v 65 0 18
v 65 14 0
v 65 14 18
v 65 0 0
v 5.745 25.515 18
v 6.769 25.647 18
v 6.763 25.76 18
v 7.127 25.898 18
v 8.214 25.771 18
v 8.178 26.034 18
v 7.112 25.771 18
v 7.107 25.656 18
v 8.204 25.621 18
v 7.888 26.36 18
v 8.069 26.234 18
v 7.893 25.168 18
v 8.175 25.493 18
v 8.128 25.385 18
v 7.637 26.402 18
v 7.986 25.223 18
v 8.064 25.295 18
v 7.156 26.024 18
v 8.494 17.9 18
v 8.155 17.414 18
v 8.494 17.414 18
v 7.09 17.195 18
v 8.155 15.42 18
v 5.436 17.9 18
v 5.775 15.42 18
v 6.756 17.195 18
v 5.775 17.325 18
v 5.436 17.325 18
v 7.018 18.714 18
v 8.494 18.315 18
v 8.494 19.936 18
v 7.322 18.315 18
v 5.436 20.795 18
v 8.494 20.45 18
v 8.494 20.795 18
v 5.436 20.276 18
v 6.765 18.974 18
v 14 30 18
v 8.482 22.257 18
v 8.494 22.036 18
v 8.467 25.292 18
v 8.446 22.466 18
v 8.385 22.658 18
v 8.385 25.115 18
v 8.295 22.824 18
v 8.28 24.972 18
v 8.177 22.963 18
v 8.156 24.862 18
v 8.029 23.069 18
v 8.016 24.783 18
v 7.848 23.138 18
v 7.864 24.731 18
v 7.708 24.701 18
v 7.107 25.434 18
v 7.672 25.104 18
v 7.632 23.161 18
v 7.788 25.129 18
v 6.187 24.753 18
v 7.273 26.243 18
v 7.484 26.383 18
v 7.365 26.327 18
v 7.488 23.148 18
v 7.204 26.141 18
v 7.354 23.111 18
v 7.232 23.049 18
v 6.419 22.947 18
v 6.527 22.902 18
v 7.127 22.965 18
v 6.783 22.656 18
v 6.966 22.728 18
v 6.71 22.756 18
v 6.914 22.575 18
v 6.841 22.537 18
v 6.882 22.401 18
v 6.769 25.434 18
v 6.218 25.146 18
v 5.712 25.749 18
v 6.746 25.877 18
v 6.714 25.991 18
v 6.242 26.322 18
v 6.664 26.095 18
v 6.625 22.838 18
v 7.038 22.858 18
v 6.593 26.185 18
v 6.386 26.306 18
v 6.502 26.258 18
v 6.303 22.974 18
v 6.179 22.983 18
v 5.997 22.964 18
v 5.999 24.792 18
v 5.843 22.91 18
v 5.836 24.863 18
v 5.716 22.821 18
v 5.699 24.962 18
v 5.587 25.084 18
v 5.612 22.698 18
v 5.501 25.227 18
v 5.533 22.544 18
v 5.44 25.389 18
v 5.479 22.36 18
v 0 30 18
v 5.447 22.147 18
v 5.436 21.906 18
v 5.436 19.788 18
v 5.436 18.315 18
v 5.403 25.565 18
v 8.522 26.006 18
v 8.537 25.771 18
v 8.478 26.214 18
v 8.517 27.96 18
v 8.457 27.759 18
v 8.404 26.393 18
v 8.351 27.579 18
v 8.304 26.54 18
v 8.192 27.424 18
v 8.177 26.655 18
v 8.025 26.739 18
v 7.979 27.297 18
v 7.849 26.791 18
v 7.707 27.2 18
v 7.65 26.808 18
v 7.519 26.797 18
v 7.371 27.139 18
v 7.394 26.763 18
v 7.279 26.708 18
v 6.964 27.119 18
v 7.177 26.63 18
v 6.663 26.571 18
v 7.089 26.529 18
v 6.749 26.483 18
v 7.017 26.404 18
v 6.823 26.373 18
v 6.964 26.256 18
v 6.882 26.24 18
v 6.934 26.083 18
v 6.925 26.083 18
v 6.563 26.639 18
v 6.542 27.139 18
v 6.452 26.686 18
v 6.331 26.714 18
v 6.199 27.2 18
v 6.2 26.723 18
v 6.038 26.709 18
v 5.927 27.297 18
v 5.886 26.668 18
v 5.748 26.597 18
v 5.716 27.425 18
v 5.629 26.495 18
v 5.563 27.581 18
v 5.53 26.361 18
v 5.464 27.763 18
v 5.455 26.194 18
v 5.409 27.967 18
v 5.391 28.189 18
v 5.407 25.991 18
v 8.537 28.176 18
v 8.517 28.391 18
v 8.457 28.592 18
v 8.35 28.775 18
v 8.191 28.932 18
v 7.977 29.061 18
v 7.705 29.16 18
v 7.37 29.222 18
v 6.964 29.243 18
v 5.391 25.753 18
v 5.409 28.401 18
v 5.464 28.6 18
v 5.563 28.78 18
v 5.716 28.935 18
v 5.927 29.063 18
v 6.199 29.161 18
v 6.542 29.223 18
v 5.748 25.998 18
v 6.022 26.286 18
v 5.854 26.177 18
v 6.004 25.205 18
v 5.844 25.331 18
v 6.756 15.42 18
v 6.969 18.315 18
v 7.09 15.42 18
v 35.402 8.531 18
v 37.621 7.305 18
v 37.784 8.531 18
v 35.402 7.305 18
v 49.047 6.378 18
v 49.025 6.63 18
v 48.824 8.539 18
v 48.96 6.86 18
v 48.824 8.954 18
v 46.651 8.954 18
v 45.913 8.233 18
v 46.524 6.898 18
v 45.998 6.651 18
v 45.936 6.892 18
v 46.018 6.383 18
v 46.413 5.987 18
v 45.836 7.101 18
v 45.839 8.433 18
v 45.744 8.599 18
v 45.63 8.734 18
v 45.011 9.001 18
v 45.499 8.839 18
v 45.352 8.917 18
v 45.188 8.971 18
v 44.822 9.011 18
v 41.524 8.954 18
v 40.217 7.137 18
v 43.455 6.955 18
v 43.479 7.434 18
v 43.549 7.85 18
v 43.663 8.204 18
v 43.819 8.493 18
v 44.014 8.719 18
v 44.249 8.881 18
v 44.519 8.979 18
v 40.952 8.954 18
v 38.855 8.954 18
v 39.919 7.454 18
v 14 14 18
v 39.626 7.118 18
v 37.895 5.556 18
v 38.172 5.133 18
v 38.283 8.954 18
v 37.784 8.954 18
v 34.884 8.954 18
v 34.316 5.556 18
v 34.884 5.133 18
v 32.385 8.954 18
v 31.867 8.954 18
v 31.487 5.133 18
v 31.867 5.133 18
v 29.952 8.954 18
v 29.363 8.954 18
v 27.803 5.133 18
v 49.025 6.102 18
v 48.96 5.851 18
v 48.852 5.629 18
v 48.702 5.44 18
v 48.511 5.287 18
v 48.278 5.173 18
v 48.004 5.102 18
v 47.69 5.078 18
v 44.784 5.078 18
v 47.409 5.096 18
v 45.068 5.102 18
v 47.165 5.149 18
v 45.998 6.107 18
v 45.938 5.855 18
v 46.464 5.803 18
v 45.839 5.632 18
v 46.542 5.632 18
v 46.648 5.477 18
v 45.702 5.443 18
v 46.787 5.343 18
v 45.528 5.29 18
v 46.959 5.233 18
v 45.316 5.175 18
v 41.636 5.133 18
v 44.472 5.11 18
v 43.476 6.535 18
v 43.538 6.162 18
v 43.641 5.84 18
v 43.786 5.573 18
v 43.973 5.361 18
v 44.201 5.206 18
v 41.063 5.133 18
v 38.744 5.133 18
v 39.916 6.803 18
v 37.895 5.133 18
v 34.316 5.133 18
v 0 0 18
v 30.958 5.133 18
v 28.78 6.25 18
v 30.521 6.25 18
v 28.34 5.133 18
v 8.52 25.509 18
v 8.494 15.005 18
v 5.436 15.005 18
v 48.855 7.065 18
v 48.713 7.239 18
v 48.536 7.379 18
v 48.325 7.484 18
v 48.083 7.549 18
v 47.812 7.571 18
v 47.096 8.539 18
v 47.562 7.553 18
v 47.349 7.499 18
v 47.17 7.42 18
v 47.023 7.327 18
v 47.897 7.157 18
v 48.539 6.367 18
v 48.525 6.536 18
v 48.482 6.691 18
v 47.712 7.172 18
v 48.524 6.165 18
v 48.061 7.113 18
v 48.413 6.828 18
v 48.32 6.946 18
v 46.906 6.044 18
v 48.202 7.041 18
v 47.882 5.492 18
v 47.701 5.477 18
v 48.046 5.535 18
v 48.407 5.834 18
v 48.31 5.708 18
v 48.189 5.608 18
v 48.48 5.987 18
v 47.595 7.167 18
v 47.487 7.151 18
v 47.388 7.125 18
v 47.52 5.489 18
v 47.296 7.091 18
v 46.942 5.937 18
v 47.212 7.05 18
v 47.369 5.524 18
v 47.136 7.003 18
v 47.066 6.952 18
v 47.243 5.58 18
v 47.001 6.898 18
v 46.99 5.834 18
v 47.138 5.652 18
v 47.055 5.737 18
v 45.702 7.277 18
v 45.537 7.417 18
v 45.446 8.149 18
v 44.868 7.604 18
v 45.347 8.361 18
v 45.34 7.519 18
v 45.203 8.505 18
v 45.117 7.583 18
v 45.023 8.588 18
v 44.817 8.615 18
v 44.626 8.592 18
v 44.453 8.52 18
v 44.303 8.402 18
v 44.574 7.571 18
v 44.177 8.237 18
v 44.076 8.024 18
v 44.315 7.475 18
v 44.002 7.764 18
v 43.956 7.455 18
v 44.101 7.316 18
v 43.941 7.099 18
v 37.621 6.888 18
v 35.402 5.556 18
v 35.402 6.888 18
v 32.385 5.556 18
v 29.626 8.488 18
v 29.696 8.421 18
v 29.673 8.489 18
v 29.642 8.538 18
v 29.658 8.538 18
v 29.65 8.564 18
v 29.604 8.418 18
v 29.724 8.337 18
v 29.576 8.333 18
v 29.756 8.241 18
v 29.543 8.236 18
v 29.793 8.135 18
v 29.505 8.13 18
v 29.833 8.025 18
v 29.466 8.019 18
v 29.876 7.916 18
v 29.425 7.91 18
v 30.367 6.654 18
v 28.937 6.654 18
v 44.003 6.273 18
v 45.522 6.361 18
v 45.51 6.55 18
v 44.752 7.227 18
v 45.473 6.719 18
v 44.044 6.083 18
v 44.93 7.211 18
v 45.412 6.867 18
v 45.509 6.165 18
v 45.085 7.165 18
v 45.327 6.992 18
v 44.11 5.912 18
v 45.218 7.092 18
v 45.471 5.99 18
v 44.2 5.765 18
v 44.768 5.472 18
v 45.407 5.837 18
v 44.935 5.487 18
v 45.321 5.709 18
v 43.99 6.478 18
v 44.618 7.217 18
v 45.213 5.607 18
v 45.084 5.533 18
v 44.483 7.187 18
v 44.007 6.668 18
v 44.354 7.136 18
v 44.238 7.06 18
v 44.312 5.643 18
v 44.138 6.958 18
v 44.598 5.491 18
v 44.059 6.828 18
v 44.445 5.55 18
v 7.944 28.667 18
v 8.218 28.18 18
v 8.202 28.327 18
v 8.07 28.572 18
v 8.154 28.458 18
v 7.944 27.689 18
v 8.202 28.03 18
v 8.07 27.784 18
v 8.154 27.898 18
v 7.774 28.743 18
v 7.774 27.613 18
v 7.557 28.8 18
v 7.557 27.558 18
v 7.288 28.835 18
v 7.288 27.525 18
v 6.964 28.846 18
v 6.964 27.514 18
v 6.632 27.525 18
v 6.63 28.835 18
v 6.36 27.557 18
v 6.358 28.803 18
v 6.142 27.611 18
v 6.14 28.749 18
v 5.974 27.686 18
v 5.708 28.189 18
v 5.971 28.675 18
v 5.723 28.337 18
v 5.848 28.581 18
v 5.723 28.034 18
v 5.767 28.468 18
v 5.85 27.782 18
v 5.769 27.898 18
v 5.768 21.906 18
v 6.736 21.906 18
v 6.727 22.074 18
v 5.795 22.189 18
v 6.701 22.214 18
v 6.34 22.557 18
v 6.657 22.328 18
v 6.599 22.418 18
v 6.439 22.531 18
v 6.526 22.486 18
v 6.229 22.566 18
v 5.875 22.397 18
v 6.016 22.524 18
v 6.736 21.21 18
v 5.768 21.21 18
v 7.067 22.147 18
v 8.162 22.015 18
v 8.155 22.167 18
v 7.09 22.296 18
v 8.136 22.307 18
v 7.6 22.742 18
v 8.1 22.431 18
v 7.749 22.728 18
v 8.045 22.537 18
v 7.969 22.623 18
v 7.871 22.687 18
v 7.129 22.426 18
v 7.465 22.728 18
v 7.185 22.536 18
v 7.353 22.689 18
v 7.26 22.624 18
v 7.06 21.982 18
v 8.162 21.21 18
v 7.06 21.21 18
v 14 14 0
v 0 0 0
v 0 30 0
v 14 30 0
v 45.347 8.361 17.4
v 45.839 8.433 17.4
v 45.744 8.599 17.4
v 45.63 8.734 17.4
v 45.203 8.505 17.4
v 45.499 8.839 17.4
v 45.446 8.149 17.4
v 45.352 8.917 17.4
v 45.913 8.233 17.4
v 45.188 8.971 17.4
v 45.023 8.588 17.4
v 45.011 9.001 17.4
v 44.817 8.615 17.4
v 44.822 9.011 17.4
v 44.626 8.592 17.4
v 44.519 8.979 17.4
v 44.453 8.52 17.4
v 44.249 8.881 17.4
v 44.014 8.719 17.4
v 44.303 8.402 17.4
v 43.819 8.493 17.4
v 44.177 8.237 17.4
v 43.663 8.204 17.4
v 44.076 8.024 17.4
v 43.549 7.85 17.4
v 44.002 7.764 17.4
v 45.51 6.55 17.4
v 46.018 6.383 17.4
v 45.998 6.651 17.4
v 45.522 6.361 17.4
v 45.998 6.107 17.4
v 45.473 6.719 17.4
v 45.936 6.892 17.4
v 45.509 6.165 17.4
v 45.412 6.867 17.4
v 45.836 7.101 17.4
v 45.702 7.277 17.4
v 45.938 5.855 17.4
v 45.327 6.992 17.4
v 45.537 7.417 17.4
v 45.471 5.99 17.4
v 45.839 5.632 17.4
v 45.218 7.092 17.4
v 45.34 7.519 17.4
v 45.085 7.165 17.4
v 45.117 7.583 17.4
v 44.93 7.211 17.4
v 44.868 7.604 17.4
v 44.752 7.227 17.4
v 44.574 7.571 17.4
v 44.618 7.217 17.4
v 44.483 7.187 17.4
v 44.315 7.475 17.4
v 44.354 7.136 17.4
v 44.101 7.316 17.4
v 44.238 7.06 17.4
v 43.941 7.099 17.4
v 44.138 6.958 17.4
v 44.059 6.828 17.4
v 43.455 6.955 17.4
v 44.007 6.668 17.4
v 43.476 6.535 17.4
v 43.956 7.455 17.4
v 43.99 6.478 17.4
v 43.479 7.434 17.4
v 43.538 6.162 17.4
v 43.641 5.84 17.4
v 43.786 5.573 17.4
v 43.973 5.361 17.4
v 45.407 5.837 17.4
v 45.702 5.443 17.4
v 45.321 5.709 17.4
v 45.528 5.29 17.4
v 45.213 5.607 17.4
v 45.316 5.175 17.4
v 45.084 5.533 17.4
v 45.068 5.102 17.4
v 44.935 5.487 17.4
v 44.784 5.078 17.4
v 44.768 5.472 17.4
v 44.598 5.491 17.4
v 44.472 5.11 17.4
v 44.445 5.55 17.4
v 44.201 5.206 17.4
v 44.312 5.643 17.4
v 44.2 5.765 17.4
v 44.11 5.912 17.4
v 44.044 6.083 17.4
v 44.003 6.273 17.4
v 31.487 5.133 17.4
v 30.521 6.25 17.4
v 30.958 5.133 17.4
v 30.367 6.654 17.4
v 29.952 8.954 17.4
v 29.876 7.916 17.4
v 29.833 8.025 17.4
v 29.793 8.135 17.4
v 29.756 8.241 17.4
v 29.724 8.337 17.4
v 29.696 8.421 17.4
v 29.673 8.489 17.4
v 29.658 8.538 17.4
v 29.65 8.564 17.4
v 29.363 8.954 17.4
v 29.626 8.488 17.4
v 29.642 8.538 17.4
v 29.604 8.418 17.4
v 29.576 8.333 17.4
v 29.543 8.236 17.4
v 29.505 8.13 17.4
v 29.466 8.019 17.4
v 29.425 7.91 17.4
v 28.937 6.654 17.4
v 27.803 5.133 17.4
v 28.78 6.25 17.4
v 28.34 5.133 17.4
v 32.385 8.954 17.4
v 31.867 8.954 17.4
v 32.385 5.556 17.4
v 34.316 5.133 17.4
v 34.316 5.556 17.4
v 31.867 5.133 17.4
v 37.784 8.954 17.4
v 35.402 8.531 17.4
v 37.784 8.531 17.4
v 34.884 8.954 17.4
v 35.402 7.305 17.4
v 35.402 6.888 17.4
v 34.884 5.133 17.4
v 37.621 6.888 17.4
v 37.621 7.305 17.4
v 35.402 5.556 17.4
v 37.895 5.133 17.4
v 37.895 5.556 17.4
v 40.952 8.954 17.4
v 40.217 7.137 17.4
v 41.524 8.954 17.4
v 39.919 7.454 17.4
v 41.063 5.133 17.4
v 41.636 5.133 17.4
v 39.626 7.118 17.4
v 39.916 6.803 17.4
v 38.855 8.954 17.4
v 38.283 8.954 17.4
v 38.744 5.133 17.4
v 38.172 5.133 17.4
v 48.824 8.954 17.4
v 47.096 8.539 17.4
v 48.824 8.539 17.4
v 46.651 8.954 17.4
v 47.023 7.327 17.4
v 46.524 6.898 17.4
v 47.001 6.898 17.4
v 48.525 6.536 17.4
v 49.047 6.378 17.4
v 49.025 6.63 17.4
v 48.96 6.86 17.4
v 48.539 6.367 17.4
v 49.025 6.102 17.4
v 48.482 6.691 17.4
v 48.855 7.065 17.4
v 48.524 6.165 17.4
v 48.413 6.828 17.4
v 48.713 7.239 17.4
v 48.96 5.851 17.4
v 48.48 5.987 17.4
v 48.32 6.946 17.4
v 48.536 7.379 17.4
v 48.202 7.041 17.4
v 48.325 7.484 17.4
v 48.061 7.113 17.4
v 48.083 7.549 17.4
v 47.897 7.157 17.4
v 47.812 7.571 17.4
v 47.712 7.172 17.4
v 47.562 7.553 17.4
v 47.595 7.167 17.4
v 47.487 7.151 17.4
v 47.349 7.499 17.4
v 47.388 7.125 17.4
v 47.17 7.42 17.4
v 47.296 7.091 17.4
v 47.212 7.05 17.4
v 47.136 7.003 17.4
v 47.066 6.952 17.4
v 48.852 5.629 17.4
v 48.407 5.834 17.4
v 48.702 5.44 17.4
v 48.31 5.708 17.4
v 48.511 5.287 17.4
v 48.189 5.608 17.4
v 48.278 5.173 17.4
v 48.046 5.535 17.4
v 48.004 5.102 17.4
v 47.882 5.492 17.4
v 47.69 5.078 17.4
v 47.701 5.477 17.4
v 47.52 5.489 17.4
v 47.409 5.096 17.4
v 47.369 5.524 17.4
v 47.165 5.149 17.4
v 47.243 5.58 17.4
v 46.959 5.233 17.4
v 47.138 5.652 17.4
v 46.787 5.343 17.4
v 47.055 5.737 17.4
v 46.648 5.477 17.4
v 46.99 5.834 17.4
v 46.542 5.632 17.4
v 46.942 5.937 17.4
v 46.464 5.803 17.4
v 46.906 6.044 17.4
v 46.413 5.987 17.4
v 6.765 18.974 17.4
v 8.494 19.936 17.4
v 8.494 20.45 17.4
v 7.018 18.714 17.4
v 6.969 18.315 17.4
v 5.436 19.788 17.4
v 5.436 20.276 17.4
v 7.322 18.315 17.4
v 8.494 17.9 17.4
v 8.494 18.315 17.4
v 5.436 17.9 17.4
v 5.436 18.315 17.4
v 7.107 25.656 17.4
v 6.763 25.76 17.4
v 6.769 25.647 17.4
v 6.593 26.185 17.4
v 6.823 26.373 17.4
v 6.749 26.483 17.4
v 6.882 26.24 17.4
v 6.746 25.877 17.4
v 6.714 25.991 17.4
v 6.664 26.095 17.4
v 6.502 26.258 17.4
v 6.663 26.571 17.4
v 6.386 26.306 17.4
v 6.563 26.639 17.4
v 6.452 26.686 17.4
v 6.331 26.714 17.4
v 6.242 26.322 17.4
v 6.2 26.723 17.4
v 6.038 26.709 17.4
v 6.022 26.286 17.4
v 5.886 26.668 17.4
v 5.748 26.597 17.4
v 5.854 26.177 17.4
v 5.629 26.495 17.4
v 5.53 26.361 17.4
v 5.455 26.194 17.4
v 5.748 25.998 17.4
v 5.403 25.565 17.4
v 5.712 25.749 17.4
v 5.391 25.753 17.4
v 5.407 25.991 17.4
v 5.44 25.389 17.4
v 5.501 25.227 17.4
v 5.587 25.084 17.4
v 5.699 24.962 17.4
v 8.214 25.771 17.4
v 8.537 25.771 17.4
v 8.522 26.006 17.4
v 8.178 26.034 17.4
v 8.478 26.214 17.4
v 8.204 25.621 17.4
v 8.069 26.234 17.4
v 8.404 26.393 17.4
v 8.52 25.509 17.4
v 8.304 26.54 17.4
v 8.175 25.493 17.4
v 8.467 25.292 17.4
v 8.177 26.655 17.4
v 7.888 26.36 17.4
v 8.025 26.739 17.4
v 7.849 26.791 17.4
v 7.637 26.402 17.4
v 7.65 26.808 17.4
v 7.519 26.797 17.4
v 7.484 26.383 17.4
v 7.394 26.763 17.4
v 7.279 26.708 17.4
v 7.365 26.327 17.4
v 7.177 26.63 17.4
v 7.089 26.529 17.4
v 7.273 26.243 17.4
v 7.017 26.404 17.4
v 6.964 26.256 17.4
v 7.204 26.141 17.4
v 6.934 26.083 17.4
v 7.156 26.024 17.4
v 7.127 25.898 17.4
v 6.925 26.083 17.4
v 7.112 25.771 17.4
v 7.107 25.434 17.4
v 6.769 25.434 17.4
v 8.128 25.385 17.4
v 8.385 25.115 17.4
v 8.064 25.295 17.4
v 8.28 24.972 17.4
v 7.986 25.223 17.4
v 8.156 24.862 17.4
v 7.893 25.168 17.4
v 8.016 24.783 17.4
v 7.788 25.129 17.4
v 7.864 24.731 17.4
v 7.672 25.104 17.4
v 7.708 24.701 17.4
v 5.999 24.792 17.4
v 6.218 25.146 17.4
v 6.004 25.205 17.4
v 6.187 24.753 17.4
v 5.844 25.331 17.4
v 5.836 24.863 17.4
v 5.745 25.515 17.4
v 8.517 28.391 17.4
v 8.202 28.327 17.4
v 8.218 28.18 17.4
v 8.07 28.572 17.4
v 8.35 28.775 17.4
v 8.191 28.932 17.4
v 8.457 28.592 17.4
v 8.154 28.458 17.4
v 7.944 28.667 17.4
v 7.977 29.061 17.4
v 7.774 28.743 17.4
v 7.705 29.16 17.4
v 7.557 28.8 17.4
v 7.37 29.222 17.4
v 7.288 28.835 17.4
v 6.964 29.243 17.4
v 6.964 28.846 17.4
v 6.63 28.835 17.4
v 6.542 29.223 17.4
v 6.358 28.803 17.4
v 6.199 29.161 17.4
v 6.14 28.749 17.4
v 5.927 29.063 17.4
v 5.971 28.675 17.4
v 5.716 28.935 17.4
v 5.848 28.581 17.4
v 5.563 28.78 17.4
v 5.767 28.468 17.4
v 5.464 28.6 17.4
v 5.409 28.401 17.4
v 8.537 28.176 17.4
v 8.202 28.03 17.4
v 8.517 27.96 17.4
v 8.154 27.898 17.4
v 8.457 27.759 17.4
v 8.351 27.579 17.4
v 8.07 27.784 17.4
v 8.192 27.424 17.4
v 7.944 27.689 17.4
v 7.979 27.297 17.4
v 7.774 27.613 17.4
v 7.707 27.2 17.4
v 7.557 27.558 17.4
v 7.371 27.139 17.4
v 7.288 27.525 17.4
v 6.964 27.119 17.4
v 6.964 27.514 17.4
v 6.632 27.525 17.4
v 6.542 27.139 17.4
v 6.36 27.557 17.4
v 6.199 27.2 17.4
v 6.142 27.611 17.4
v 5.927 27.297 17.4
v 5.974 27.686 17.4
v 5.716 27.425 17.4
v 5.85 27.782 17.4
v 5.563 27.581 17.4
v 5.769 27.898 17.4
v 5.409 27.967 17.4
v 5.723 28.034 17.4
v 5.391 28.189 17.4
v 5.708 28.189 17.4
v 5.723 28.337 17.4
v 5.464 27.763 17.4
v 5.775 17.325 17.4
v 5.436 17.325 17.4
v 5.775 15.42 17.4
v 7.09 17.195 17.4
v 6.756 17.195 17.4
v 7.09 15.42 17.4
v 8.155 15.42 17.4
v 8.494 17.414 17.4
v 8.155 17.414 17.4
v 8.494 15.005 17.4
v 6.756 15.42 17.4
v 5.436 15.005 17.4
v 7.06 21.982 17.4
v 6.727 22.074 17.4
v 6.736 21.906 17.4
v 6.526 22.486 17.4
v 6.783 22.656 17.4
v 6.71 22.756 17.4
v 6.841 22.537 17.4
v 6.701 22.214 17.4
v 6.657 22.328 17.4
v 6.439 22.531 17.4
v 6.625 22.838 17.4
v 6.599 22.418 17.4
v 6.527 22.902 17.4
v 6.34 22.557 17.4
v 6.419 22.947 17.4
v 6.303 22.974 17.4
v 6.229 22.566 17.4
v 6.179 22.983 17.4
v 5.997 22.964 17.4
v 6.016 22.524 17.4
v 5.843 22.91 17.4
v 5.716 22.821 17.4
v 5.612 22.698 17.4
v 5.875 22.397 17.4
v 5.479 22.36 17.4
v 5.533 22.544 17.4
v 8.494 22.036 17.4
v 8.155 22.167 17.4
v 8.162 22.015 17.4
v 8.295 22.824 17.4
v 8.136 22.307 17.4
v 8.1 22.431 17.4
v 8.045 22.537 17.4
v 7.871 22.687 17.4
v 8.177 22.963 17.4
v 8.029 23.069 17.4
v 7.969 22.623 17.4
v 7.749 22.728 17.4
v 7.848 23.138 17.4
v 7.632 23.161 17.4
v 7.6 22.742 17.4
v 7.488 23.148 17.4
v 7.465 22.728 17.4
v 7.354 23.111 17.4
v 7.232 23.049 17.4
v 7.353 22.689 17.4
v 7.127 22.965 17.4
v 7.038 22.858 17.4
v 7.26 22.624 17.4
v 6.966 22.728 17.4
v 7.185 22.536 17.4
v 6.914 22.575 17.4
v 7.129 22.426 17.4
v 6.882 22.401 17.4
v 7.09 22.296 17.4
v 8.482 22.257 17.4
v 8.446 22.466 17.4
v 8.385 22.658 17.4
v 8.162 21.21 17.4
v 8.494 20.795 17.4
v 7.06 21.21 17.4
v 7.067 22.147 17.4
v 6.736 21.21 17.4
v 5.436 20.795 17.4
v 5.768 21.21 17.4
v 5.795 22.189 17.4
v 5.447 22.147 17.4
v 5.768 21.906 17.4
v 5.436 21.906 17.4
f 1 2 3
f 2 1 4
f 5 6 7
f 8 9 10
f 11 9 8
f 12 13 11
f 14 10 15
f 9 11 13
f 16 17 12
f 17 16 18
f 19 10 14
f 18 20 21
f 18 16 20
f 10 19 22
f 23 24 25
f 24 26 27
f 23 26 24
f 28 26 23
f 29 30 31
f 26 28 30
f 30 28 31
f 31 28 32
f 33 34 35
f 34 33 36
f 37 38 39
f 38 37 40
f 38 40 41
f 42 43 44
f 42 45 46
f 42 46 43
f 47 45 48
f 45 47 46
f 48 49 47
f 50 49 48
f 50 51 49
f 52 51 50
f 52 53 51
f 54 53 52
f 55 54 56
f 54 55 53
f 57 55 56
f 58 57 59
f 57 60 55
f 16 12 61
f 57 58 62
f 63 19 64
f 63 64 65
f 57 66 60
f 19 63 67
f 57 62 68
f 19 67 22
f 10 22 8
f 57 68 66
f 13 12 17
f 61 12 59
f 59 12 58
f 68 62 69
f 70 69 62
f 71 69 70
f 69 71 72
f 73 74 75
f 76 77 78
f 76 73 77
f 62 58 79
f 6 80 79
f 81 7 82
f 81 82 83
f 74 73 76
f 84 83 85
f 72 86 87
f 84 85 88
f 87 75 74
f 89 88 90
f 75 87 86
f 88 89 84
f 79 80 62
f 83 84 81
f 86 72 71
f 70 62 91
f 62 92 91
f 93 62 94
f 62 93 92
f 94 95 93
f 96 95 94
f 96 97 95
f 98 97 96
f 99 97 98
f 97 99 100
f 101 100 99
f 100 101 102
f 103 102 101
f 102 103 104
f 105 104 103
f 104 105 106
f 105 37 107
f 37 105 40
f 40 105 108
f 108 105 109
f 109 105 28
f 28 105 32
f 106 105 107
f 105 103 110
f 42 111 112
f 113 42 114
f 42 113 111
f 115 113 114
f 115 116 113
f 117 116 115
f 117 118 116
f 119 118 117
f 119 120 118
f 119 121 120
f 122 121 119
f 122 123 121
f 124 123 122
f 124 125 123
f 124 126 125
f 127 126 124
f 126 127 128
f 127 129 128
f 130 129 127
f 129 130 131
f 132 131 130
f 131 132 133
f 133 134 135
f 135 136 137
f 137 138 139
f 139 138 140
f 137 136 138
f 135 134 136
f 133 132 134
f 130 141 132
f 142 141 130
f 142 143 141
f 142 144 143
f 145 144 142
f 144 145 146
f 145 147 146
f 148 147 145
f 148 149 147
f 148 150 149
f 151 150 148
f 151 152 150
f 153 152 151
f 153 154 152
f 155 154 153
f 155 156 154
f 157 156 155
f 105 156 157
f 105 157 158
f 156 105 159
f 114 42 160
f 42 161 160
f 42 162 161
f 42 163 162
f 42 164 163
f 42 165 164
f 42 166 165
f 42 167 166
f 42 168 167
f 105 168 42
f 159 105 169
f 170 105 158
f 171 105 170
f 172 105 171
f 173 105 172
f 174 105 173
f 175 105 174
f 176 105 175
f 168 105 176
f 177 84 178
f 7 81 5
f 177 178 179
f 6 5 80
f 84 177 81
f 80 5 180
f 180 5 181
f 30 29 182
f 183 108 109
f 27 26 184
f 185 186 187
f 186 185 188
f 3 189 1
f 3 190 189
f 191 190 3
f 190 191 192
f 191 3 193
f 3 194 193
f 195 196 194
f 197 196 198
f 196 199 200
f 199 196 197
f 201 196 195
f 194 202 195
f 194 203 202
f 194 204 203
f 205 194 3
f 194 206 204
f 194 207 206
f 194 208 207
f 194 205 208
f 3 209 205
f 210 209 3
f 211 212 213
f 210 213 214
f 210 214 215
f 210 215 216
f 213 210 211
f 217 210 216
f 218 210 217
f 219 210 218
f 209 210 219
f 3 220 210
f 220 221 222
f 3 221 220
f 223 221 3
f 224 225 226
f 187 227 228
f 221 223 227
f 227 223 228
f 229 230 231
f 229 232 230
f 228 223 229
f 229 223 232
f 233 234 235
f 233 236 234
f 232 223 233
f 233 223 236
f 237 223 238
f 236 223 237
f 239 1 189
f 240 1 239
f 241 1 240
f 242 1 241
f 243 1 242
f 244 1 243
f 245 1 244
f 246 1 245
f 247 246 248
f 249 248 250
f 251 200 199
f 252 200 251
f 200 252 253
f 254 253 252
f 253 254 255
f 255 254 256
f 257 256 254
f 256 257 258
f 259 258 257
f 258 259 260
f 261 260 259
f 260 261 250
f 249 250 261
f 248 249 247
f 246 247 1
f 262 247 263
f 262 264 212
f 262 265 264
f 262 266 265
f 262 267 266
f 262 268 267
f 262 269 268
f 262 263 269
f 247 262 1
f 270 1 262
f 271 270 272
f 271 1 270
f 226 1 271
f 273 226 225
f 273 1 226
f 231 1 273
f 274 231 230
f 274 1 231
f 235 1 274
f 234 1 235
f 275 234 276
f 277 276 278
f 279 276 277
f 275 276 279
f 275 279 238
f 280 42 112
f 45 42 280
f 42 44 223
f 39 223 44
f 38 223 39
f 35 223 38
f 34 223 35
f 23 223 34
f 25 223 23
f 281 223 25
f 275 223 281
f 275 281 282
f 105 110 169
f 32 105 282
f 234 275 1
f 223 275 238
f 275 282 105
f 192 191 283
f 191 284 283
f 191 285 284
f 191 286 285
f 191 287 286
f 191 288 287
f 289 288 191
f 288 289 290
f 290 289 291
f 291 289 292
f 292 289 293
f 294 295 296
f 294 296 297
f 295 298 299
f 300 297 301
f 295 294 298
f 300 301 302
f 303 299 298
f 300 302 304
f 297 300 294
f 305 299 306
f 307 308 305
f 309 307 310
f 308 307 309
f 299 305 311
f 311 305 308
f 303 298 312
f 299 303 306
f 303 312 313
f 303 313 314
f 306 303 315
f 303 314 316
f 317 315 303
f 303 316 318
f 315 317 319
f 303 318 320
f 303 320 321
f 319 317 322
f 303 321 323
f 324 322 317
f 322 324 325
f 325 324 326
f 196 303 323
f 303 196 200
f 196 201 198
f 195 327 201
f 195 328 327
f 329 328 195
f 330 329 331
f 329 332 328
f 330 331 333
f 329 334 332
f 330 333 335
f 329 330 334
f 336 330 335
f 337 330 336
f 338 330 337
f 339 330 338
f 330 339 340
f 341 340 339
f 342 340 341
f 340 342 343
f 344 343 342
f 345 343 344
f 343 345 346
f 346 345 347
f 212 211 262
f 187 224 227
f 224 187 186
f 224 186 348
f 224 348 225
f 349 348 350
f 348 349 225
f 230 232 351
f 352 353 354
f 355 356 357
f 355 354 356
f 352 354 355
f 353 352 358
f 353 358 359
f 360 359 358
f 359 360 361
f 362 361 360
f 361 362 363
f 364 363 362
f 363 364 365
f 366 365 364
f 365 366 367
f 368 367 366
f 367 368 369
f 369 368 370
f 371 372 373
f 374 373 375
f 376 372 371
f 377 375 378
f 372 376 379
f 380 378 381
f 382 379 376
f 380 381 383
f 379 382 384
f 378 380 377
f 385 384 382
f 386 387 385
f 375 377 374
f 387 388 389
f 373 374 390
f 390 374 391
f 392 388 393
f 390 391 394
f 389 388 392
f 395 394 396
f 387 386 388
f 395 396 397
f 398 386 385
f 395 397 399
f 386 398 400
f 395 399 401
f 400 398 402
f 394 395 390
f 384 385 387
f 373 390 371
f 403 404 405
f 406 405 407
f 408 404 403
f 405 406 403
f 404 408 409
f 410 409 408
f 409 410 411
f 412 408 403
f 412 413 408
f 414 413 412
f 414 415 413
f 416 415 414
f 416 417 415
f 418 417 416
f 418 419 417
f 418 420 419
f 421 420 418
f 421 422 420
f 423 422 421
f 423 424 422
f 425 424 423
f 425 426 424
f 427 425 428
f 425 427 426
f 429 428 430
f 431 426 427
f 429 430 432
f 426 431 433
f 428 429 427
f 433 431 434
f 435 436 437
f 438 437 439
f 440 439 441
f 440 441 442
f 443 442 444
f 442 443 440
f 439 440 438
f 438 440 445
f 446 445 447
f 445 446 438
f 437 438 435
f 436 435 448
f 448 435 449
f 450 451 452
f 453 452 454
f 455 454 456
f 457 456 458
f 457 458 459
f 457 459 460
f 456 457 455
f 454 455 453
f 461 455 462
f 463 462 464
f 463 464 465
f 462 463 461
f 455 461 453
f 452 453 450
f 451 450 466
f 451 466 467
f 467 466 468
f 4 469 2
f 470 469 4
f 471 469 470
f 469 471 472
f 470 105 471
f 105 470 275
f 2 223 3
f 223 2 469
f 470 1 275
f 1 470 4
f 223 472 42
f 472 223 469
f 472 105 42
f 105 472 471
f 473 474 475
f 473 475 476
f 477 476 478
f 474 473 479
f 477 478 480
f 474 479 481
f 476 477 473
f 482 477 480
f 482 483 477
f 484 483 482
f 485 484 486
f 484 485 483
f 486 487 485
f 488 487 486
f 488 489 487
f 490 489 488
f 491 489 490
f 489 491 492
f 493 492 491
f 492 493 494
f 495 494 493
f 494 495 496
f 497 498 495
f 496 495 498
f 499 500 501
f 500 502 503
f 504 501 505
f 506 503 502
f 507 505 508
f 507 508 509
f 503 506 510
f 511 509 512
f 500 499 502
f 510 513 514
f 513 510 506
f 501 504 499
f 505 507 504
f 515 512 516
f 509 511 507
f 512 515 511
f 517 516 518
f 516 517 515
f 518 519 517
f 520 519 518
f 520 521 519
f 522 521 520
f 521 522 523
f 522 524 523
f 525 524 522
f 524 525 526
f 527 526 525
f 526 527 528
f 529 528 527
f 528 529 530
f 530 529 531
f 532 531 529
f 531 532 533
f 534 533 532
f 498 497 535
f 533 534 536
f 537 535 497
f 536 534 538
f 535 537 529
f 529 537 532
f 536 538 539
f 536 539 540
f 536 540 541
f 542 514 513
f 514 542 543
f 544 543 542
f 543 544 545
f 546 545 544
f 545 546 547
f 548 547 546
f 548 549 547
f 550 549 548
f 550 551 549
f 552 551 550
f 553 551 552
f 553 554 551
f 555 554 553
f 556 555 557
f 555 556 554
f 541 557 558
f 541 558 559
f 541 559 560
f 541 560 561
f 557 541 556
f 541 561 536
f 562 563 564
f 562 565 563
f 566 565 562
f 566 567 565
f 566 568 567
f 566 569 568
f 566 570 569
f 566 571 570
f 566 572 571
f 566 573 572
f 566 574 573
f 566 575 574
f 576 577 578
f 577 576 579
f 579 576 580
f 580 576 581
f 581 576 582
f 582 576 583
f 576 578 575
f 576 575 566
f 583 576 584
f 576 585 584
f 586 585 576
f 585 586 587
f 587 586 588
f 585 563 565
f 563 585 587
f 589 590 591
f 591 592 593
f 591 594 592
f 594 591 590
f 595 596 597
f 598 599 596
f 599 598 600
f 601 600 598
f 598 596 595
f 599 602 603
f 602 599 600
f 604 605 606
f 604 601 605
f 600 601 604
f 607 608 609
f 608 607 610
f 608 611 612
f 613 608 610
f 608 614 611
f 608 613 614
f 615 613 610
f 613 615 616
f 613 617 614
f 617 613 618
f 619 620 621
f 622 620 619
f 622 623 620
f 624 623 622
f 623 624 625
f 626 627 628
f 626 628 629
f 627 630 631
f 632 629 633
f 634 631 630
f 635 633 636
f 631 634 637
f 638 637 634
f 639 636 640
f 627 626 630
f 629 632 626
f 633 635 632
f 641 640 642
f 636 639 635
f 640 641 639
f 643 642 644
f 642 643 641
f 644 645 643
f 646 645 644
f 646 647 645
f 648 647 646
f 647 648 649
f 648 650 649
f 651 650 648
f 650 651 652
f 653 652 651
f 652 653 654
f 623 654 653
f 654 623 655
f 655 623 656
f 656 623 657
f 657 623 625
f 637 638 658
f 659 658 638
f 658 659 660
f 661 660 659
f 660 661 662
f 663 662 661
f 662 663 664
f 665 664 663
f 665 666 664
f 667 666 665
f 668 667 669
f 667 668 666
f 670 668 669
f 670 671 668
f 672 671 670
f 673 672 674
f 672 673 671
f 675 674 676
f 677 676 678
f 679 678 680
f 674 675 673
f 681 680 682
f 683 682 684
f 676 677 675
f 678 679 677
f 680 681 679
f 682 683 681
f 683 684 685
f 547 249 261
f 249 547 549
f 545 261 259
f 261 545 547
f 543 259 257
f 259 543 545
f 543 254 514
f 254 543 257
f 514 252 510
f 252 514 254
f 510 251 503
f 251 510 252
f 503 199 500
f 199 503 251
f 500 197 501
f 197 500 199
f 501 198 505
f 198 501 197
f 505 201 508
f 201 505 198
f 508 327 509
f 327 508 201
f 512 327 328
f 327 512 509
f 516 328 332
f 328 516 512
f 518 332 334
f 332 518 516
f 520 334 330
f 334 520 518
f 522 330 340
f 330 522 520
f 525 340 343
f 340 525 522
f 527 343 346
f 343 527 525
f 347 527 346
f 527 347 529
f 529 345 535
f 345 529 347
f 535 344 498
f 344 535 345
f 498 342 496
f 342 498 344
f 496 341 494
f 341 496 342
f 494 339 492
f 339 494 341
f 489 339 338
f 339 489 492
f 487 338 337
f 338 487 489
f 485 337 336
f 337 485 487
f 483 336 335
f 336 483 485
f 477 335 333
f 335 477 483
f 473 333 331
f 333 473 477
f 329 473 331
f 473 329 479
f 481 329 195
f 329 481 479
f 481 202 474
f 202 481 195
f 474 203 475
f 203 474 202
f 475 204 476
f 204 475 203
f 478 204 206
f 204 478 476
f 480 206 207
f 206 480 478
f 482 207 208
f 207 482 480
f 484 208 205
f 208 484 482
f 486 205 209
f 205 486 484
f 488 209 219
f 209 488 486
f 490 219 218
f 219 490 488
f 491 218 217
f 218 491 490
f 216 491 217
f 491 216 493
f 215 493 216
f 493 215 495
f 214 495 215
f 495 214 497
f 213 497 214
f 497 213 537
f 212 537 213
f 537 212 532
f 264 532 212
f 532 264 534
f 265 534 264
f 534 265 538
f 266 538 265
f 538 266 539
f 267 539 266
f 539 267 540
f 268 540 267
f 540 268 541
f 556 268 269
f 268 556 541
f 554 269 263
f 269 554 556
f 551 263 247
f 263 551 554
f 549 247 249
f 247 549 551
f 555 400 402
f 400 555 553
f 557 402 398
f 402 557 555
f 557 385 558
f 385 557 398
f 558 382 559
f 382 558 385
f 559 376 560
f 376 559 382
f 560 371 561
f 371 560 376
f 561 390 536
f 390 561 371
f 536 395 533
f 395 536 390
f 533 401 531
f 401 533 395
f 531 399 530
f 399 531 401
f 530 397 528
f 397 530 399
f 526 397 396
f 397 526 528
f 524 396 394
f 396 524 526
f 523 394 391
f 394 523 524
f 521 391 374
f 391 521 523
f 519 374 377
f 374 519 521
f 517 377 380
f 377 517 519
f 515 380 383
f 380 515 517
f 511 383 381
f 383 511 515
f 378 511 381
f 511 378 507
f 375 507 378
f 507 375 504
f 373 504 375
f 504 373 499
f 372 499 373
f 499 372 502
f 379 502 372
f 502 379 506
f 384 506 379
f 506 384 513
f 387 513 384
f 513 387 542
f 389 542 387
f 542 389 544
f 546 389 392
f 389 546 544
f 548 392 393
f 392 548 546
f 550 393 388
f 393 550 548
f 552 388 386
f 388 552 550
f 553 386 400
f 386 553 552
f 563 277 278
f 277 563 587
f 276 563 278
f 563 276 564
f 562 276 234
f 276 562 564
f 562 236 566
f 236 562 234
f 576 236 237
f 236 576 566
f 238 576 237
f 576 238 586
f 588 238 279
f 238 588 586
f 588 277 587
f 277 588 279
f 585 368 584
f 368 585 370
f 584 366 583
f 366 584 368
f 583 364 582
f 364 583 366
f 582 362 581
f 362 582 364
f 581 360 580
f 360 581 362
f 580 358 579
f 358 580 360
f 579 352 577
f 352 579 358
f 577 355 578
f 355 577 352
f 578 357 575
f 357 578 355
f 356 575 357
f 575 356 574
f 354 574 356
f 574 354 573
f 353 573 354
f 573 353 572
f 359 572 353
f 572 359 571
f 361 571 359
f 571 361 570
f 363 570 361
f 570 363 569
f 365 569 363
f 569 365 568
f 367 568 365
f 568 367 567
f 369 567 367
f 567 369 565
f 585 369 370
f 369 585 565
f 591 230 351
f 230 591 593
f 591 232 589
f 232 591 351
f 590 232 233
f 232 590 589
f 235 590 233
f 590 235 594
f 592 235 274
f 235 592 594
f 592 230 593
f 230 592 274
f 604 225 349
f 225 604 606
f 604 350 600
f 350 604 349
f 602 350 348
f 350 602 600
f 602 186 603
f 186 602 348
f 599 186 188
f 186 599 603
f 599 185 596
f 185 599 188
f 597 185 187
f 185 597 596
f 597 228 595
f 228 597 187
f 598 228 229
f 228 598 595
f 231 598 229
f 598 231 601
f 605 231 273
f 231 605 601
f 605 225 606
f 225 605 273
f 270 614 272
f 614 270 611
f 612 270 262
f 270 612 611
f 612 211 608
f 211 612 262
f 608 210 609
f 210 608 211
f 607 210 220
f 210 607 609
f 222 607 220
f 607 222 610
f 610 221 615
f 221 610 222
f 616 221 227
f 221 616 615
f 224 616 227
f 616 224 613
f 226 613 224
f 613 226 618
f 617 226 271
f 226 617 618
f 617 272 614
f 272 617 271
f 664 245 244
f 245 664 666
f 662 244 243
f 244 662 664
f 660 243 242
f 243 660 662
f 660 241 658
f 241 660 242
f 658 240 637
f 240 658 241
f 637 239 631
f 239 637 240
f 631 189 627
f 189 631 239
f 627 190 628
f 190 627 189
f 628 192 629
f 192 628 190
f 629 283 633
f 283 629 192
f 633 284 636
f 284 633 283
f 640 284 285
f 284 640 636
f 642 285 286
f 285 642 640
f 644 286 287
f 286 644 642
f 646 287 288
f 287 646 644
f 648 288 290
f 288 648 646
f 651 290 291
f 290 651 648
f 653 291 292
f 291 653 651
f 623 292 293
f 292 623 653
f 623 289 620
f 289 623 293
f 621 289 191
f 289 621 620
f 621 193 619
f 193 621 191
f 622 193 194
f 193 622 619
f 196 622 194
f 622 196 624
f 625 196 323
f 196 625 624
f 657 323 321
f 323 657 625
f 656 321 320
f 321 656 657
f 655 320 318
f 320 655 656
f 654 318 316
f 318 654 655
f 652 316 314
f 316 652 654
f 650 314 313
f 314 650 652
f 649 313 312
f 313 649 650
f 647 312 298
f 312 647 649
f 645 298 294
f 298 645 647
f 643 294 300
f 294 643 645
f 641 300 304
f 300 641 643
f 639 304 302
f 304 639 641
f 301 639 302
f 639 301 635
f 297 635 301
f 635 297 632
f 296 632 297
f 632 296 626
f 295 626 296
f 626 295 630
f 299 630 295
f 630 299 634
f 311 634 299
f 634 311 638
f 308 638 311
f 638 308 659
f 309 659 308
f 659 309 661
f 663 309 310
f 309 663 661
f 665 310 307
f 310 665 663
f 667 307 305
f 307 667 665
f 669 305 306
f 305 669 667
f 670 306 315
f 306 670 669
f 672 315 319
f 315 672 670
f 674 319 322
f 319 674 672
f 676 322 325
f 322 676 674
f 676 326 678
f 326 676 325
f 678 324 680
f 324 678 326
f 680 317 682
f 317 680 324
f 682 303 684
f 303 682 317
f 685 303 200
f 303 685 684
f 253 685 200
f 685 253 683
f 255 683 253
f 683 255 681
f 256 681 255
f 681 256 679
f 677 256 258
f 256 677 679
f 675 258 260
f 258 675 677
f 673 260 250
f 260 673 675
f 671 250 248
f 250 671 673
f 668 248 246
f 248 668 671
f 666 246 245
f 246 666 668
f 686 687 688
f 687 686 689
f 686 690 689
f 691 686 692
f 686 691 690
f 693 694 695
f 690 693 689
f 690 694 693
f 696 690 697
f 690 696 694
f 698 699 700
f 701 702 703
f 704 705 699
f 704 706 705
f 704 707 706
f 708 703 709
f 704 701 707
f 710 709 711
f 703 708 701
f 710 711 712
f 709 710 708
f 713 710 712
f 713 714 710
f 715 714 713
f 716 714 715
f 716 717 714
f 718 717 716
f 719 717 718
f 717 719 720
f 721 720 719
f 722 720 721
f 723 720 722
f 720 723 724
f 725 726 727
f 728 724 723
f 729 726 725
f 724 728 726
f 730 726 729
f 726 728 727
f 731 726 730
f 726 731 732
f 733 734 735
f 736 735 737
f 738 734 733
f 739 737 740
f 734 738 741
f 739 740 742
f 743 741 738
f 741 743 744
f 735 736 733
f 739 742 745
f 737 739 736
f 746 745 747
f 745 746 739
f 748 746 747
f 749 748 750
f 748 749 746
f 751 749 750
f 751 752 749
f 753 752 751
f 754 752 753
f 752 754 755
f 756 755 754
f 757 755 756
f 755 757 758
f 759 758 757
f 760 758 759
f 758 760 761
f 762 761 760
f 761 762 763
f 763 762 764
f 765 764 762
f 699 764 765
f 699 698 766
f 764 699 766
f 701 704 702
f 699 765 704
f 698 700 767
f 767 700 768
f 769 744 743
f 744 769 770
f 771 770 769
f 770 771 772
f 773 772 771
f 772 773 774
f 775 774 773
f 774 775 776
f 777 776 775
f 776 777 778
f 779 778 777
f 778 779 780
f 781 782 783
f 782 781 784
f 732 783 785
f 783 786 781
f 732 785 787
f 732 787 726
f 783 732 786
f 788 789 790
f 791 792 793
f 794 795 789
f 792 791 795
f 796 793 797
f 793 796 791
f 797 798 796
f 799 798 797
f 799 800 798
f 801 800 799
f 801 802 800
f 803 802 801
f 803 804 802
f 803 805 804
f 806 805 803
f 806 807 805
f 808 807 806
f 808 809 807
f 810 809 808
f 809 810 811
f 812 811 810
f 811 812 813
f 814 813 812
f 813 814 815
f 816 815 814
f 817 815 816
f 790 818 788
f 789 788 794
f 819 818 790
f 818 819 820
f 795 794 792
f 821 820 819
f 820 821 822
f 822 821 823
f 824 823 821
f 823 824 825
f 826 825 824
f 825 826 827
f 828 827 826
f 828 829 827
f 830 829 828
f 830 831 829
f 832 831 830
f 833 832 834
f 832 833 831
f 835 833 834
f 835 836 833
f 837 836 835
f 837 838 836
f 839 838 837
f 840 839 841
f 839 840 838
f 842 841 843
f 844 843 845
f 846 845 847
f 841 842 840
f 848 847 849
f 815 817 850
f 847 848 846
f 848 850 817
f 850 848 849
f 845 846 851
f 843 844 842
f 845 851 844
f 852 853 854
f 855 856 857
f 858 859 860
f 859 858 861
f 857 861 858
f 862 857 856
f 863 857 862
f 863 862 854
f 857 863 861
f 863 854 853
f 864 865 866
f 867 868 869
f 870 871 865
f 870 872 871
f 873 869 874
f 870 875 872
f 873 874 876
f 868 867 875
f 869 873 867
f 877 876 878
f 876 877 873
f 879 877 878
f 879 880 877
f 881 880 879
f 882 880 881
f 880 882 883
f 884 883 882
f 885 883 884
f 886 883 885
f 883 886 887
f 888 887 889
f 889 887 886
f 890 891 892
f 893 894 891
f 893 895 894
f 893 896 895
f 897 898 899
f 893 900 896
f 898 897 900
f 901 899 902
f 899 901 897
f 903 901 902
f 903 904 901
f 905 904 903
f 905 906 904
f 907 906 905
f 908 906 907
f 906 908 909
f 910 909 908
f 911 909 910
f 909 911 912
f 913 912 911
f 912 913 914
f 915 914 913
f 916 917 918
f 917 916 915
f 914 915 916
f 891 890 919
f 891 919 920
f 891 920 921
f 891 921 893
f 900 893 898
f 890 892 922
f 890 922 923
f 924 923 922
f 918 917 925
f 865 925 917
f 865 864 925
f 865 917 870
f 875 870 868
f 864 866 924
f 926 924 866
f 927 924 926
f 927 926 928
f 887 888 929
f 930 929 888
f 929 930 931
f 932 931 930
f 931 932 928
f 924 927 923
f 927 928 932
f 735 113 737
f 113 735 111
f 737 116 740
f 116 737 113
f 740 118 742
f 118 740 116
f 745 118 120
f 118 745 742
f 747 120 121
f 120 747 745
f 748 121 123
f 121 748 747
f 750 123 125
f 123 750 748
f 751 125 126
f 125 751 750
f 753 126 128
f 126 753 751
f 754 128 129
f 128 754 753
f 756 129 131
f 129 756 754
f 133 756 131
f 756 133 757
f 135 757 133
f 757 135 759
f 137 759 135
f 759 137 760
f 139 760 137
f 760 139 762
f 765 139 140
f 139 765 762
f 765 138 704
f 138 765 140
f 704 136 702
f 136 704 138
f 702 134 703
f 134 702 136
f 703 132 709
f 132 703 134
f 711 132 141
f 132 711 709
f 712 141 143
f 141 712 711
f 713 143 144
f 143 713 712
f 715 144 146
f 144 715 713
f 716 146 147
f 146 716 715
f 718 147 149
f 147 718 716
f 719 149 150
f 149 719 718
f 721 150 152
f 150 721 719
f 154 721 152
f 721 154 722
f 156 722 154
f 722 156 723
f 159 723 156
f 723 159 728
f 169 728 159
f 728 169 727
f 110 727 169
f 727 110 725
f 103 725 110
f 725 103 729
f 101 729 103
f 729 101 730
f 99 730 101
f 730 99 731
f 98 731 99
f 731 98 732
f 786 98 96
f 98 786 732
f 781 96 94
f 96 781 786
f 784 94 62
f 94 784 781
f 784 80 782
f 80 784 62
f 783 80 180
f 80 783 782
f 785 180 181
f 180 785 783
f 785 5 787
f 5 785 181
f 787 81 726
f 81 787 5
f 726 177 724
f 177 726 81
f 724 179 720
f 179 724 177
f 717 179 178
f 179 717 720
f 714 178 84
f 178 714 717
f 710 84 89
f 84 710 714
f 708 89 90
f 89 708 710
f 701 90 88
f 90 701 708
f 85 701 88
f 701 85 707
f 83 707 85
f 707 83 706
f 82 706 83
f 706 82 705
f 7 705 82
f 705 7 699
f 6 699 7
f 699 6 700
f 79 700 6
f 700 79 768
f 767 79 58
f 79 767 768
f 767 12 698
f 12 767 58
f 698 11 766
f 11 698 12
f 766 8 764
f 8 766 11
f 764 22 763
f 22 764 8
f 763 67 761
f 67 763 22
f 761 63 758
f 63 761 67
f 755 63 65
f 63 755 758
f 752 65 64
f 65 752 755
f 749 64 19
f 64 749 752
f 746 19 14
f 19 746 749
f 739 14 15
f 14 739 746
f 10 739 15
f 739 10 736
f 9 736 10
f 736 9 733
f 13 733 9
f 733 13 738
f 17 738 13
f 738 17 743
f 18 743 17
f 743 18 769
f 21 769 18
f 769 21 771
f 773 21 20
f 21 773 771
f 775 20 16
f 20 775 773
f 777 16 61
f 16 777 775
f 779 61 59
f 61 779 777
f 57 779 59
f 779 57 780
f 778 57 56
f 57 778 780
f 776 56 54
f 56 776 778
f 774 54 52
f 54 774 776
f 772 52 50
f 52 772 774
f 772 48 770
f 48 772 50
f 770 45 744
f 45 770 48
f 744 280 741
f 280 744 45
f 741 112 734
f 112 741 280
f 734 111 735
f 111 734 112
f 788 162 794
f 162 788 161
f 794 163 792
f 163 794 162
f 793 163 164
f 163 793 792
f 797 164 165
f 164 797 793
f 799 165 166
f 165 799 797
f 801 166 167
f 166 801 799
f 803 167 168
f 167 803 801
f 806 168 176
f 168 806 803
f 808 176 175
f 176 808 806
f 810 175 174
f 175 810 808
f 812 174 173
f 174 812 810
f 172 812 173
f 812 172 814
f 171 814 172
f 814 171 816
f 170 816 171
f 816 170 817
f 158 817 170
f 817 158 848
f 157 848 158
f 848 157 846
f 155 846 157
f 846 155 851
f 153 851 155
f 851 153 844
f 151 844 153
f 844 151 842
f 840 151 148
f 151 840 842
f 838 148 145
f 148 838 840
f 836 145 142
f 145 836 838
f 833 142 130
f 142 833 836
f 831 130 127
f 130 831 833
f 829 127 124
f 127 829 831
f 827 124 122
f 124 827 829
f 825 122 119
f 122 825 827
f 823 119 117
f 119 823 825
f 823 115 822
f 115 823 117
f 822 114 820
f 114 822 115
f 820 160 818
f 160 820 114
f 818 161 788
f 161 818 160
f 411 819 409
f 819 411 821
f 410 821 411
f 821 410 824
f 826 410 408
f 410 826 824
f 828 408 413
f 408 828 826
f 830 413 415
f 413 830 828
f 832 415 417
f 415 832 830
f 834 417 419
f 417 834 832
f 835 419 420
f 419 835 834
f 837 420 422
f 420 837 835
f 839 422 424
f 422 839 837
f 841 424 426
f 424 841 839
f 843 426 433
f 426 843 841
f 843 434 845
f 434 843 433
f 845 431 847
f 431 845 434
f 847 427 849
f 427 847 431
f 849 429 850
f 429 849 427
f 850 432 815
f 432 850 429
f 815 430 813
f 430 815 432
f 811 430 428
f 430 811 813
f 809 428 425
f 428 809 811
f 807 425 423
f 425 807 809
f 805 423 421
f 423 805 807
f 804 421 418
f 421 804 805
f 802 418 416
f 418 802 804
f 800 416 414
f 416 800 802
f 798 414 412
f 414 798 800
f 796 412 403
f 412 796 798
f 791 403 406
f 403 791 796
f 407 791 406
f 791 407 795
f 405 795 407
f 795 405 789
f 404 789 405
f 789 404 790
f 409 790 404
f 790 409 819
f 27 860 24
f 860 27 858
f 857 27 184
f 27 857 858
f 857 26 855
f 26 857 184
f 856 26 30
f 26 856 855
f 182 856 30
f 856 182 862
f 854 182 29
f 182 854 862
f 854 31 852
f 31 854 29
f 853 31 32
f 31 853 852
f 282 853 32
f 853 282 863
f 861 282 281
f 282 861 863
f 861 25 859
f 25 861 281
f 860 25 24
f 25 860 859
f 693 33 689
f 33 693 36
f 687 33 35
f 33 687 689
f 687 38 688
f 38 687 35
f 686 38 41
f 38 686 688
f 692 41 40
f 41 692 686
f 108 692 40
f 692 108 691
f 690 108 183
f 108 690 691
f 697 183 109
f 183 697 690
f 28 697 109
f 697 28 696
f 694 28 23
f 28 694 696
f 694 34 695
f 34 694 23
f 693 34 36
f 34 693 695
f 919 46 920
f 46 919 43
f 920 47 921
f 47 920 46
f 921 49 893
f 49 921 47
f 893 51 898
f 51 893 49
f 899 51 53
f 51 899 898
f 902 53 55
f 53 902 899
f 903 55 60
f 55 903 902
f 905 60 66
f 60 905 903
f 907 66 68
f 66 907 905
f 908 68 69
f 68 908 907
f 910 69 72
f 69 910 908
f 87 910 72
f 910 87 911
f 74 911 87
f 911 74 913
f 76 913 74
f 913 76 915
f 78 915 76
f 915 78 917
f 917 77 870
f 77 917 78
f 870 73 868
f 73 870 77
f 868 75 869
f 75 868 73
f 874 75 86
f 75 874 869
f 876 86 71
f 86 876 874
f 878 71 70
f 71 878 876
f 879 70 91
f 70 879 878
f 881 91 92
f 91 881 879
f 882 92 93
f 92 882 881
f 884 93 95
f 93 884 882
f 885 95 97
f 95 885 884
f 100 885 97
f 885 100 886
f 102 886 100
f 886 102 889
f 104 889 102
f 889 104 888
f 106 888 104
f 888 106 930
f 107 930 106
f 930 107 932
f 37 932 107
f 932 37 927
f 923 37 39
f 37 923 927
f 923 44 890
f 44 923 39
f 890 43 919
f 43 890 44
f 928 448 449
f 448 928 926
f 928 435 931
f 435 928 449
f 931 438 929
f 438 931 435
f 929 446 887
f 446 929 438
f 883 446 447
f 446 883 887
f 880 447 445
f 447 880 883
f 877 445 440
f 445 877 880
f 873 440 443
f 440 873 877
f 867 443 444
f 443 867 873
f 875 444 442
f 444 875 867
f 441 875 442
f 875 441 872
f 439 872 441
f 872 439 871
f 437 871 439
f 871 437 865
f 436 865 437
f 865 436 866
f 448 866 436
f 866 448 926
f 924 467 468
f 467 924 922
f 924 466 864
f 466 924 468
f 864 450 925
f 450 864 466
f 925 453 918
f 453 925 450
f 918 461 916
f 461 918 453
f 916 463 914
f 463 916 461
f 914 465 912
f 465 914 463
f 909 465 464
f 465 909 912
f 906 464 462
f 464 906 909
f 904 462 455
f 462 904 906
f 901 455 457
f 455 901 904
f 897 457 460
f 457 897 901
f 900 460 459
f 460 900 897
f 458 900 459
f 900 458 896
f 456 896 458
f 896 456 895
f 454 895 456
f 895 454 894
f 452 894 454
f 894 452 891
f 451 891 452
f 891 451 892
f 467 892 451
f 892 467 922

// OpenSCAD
// Wall gauge. An L with two legs: 65 mm for the ALEX units (their backs stand 6.5 cm off
// the walls: 3 cm gap plus 3.5 cm of top overhang) and 30 mm for the tops themselves (3 cm
// off the walls). Hold the 65 leg between the wall and a cabinet while you place it (manual
// step 5) and again when you slide the desk back after fitting the trim (step 8b); the 30 leg
// checks a top's raw edge against the wall before the trim goes on. Print flat, any filament.

long = 65; short = 30; w = 14; h = 18;
difference() {
    union() { cube([long, w, h]); cube([w, short, h]); }
    translate([long / 2 + 6, w / 2, h - 0.6]) linear_extrude(1) text("ALEX 65", size = 4, halign = "center", valign = "center");
    translate([w / 2, short / 2 + 7, h - 0.6]) rotate([0, 0, 90]) linear_extrude(1) text("EKB 30", size = 3.2, halign = "center", valign = "center");
}
